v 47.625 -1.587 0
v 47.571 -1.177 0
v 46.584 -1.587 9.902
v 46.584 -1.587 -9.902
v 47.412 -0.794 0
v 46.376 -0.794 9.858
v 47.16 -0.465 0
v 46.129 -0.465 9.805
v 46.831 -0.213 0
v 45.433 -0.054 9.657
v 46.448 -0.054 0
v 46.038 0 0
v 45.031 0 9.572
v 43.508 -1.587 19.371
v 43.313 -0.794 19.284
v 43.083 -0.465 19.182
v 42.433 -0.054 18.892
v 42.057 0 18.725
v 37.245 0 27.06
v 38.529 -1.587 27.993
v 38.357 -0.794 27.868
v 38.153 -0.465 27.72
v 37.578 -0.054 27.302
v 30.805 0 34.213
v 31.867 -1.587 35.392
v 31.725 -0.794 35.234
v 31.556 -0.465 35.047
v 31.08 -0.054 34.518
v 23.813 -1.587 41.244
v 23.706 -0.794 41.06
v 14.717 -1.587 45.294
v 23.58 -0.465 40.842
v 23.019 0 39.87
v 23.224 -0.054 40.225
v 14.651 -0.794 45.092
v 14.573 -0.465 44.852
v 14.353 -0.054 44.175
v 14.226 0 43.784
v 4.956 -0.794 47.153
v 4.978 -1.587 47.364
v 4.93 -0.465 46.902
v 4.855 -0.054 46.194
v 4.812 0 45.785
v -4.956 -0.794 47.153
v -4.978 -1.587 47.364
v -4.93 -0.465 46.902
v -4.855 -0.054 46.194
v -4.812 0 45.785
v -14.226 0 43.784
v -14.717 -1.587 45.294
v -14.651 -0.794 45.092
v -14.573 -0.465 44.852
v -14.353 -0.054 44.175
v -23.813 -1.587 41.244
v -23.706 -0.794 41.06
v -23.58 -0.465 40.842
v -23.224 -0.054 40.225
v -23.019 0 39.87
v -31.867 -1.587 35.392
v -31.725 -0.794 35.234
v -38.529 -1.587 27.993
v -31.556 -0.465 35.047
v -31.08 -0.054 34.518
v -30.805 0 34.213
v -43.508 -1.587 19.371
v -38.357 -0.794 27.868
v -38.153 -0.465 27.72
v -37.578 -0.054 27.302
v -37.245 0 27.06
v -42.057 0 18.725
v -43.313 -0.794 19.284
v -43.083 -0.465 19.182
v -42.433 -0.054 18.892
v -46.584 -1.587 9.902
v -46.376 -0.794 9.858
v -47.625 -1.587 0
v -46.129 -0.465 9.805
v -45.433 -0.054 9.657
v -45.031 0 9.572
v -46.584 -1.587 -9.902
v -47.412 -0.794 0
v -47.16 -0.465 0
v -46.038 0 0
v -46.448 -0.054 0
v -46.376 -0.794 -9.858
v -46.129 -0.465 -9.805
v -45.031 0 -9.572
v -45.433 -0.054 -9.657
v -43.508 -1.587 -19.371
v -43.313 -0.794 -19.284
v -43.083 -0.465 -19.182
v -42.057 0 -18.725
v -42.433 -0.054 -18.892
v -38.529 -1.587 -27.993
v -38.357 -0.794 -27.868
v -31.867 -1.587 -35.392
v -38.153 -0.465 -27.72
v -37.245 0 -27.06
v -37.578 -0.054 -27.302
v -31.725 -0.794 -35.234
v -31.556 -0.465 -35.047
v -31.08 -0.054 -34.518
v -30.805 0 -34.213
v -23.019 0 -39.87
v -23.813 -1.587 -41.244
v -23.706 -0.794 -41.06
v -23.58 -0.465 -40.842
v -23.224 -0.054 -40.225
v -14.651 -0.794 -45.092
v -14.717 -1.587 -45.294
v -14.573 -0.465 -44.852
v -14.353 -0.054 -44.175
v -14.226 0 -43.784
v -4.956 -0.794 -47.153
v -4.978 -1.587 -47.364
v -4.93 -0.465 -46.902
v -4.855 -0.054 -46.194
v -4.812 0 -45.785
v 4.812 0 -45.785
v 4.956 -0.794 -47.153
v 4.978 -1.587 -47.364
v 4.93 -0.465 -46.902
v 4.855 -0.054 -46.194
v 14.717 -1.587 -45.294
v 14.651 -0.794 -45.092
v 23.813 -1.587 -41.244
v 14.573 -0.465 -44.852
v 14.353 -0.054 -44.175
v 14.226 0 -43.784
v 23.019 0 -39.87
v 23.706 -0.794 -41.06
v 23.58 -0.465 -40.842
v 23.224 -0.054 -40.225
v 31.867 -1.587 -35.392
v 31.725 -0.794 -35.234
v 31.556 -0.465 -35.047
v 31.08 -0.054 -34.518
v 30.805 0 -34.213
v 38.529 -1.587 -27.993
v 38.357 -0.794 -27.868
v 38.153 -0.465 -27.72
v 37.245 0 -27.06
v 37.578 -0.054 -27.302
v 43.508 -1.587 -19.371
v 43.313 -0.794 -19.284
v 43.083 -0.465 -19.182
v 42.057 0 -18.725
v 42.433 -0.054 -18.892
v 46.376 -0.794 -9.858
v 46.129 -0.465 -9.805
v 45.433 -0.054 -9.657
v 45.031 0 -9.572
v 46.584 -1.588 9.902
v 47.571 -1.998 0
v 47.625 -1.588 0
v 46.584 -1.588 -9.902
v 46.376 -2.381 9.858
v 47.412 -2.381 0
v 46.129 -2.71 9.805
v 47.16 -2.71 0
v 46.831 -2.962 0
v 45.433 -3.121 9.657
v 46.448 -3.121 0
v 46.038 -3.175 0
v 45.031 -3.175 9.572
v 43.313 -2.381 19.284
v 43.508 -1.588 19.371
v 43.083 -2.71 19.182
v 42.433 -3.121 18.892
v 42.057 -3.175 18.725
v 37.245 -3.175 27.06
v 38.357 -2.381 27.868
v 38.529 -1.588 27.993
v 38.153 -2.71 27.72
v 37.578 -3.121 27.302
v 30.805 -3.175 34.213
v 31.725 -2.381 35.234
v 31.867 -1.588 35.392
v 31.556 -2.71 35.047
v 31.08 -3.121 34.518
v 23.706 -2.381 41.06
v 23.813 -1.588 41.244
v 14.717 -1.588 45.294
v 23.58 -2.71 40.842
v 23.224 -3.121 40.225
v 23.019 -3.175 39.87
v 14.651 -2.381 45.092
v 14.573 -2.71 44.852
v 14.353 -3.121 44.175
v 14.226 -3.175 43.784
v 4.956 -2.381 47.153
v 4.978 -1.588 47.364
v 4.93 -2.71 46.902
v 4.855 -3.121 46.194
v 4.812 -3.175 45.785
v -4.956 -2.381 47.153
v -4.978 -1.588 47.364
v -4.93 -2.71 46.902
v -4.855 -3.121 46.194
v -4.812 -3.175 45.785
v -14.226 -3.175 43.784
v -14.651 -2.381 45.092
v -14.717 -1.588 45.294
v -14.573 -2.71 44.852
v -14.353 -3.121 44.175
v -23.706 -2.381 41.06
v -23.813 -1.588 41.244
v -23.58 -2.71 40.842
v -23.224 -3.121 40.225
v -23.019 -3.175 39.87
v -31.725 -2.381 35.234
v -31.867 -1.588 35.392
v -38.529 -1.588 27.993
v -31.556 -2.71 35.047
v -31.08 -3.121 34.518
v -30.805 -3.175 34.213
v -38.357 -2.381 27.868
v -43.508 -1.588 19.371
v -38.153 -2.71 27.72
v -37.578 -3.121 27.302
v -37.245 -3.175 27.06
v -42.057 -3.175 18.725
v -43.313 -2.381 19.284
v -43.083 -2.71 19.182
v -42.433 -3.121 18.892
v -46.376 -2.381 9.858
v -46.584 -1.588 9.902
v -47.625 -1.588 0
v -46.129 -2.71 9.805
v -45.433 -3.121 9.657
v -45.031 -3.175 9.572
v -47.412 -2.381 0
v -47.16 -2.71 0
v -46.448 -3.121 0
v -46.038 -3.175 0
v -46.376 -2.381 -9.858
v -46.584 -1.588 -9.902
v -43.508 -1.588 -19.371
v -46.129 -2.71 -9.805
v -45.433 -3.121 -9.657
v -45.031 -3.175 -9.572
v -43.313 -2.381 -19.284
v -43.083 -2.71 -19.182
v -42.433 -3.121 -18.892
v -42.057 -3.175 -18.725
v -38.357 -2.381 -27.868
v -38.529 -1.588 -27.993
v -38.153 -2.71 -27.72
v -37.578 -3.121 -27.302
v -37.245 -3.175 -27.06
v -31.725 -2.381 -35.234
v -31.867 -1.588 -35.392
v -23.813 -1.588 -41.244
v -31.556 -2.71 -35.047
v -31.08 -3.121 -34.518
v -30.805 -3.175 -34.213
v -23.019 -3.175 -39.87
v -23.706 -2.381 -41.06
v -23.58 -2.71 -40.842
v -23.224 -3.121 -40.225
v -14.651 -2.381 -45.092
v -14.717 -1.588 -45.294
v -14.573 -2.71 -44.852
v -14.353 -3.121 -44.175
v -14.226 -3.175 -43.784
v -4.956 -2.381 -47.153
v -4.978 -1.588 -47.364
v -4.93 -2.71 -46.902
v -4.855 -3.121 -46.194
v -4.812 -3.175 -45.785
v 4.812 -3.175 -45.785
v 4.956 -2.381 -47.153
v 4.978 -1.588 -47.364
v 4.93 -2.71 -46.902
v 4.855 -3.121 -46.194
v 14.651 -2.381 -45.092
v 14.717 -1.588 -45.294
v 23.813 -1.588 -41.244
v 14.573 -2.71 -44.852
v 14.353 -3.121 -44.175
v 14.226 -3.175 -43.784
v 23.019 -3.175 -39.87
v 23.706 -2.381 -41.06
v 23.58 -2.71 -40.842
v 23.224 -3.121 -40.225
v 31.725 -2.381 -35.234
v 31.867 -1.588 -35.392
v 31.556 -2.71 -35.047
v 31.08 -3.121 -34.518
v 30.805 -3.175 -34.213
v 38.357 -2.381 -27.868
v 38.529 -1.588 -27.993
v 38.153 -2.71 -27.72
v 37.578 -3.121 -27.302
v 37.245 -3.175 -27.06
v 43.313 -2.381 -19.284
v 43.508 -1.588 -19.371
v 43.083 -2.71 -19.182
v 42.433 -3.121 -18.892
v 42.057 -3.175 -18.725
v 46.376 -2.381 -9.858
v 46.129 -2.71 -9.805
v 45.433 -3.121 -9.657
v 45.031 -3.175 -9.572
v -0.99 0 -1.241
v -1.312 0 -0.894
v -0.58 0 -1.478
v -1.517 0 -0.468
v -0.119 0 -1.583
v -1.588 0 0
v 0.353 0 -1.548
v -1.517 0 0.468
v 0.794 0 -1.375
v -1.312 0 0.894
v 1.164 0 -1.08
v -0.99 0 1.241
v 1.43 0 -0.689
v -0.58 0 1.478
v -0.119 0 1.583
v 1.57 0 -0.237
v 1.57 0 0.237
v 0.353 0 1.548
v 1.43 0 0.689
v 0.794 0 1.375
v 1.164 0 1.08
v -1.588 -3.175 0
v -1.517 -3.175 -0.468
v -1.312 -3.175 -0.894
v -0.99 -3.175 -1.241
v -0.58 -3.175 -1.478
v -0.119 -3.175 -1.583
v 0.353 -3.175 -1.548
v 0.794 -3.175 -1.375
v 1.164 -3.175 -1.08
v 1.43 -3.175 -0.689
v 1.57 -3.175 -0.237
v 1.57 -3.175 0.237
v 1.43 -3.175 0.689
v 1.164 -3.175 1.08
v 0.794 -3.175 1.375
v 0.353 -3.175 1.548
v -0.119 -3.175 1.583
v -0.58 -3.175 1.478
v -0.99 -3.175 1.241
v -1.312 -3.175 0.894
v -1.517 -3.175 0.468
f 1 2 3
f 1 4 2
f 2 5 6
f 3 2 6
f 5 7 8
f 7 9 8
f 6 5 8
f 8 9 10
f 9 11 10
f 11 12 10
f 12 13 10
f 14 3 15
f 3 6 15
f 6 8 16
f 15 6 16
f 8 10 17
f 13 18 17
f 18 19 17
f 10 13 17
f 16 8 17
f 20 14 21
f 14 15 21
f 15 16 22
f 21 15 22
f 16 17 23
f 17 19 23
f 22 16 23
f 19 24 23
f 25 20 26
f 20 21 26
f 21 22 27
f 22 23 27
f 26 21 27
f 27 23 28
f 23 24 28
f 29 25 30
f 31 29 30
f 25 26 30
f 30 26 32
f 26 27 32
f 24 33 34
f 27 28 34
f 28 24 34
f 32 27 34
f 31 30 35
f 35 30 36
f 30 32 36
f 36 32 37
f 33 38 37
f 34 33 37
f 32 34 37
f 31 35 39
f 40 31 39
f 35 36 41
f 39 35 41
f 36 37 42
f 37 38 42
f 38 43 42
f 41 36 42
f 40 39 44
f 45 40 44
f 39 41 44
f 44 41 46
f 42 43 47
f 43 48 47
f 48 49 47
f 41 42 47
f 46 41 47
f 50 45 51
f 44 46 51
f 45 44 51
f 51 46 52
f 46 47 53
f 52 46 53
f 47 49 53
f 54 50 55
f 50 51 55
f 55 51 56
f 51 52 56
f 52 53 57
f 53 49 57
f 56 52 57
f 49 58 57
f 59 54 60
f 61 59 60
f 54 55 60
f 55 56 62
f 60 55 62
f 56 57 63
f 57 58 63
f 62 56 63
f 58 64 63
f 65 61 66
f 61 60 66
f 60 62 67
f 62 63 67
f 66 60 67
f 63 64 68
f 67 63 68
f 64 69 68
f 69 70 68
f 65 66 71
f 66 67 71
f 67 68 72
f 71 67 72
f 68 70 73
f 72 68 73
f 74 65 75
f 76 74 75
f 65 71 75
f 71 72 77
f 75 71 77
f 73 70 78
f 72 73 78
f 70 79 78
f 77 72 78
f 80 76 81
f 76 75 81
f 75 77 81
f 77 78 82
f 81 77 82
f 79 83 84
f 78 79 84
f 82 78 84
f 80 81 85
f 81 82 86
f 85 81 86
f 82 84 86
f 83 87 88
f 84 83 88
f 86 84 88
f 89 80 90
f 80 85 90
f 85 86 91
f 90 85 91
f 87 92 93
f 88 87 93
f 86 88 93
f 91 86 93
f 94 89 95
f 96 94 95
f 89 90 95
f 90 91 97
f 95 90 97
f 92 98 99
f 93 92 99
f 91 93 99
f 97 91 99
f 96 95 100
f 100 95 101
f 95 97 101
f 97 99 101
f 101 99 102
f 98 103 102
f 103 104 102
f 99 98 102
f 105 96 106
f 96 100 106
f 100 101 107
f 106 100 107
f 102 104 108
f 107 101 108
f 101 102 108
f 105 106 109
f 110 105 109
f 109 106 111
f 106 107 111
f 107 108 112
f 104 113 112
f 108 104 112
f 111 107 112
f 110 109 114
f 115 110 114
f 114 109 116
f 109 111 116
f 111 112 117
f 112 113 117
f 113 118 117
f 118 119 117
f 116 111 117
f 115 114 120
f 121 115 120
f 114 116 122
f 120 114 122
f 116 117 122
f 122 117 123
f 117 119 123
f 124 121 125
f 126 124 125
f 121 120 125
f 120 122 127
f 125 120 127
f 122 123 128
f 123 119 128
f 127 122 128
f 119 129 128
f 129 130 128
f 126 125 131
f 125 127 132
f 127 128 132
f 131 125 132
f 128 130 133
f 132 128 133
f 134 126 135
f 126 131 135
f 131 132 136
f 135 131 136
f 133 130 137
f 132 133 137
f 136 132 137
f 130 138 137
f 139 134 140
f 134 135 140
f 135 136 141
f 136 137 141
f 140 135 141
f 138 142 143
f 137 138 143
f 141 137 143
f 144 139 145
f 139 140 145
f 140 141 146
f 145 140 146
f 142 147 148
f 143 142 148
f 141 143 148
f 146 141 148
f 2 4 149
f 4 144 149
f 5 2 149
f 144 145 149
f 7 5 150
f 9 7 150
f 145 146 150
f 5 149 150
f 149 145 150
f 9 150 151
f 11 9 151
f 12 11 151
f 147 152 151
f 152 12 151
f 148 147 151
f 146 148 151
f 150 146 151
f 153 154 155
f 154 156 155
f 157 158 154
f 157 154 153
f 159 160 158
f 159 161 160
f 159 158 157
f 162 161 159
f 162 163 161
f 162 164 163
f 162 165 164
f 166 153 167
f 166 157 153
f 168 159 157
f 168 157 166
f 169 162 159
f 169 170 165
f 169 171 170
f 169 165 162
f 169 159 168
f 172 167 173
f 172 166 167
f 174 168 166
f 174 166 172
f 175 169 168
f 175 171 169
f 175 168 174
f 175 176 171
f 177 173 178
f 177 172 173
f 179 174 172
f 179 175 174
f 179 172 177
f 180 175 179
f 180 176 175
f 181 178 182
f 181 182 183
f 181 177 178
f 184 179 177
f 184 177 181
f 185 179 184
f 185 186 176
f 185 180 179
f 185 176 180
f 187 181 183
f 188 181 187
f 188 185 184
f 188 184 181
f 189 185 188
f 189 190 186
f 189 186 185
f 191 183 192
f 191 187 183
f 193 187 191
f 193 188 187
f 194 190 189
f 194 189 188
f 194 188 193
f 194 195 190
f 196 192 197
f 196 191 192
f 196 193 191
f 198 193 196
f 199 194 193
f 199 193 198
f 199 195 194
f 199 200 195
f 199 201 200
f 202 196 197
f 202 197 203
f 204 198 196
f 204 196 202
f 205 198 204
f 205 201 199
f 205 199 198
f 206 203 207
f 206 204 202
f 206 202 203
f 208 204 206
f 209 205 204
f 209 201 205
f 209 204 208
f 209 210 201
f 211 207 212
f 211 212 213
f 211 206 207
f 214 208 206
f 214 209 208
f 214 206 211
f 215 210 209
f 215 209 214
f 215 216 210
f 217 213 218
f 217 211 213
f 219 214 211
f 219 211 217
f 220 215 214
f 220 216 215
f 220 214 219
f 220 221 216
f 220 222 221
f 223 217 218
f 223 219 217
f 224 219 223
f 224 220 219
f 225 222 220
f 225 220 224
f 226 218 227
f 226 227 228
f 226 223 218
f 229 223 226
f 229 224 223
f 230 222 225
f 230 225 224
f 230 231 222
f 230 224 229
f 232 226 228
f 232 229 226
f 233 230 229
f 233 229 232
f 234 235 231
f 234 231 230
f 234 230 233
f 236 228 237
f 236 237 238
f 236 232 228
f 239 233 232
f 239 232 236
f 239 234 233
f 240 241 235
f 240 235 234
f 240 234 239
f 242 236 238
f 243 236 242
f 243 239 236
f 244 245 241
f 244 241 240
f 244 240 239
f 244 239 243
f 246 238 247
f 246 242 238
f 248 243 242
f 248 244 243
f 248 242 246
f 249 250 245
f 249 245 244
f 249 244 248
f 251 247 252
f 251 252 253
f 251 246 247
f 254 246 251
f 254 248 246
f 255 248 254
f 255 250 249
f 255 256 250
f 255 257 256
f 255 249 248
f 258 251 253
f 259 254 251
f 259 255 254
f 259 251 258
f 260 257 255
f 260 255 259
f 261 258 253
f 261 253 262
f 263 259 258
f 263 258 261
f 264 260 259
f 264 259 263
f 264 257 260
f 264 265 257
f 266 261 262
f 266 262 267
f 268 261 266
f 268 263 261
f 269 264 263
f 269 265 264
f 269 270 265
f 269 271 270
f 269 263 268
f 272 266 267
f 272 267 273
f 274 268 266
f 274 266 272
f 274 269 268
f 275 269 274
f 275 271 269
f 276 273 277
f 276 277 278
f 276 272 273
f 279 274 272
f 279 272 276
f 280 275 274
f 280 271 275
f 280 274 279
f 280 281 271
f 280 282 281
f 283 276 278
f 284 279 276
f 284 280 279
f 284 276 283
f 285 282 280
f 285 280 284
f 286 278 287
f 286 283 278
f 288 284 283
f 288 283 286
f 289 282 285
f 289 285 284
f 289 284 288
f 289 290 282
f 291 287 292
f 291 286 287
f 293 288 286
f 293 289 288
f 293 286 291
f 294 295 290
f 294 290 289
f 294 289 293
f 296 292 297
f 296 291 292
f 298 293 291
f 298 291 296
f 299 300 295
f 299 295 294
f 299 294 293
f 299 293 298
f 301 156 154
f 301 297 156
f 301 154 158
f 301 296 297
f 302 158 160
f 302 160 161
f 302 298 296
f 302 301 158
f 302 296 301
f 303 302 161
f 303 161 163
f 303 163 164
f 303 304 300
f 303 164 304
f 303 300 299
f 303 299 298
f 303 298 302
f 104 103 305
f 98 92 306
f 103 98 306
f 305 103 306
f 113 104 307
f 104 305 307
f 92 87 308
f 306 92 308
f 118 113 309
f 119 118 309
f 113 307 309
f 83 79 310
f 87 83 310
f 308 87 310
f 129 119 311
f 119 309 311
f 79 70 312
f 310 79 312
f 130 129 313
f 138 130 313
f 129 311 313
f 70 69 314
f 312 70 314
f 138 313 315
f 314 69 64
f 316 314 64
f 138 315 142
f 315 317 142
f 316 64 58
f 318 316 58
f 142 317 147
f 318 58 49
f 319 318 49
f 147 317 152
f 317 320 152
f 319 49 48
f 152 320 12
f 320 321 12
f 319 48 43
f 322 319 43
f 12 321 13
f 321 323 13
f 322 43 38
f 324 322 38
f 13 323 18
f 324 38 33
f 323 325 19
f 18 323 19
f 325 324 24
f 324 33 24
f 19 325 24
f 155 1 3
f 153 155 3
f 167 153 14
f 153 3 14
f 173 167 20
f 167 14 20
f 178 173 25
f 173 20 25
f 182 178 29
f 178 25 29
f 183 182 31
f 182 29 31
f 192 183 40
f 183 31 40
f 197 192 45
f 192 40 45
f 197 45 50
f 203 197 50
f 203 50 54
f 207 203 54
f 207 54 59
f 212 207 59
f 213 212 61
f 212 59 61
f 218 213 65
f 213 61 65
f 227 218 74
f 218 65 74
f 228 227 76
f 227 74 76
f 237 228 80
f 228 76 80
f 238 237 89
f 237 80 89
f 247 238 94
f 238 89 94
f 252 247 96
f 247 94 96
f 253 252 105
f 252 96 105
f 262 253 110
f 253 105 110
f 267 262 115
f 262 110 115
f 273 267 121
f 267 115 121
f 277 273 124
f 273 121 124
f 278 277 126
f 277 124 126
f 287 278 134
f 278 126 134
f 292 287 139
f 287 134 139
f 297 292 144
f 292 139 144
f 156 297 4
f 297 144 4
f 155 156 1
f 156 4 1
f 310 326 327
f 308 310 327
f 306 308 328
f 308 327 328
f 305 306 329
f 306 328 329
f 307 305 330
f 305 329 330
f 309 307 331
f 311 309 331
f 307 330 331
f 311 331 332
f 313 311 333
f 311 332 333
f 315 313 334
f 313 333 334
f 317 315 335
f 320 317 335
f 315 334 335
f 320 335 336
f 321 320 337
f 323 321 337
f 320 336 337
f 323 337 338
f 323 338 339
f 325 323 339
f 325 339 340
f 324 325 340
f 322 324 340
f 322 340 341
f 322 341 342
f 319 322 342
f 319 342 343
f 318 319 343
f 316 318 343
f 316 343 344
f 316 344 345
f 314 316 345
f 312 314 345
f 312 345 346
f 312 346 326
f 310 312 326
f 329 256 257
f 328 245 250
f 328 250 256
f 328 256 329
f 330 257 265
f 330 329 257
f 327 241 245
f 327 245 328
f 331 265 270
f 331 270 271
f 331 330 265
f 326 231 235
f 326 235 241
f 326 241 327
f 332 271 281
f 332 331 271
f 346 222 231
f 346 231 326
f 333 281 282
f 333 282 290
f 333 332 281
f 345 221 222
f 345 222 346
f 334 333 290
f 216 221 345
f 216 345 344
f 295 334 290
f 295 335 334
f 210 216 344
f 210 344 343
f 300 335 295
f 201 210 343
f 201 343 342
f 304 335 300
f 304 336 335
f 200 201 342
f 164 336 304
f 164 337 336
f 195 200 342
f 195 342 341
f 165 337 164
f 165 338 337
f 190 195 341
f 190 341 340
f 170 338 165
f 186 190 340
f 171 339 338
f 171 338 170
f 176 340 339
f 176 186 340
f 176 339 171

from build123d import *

# Parameters (mm, degrees)
F0_R     = 47.625
F1_DEPTH = 3.175
F2_R     = 1.58749
F3_D     = 3.175


# Not quite as in the source:
# - a fillet or chamfer is up to 0.001 mm smaller than in the source, because OpenCascade refuses the exact size


with BuildPart() as f1:
    # F0 (on Front) → F1 (new body)
    with BuildSketch(Plane.XZ):
        Circle(F0_R)
    extrude(amount=F1_DEPTH)

    # F2 (radius 1.5875 in the source; OpenCascade refuses exactly that, so slightly less here)
    f2_edges = [f1.edges().sort_by_distance(p)[0] for p in [
        (-47.625, -3.175, 0),
        (-47.625, 0, 0),
    ]]
    fillet(f2_edges, radius=F2_R)

    # F3 (through all)
    with Locations(Plane(origin=(0, 0, 0), x_dir=(1, 0, 0), z_dir=(0, 1, 0))):
        with Locations((0, 0)):
            Hole(F3_D / 2)


solid = f1.part
